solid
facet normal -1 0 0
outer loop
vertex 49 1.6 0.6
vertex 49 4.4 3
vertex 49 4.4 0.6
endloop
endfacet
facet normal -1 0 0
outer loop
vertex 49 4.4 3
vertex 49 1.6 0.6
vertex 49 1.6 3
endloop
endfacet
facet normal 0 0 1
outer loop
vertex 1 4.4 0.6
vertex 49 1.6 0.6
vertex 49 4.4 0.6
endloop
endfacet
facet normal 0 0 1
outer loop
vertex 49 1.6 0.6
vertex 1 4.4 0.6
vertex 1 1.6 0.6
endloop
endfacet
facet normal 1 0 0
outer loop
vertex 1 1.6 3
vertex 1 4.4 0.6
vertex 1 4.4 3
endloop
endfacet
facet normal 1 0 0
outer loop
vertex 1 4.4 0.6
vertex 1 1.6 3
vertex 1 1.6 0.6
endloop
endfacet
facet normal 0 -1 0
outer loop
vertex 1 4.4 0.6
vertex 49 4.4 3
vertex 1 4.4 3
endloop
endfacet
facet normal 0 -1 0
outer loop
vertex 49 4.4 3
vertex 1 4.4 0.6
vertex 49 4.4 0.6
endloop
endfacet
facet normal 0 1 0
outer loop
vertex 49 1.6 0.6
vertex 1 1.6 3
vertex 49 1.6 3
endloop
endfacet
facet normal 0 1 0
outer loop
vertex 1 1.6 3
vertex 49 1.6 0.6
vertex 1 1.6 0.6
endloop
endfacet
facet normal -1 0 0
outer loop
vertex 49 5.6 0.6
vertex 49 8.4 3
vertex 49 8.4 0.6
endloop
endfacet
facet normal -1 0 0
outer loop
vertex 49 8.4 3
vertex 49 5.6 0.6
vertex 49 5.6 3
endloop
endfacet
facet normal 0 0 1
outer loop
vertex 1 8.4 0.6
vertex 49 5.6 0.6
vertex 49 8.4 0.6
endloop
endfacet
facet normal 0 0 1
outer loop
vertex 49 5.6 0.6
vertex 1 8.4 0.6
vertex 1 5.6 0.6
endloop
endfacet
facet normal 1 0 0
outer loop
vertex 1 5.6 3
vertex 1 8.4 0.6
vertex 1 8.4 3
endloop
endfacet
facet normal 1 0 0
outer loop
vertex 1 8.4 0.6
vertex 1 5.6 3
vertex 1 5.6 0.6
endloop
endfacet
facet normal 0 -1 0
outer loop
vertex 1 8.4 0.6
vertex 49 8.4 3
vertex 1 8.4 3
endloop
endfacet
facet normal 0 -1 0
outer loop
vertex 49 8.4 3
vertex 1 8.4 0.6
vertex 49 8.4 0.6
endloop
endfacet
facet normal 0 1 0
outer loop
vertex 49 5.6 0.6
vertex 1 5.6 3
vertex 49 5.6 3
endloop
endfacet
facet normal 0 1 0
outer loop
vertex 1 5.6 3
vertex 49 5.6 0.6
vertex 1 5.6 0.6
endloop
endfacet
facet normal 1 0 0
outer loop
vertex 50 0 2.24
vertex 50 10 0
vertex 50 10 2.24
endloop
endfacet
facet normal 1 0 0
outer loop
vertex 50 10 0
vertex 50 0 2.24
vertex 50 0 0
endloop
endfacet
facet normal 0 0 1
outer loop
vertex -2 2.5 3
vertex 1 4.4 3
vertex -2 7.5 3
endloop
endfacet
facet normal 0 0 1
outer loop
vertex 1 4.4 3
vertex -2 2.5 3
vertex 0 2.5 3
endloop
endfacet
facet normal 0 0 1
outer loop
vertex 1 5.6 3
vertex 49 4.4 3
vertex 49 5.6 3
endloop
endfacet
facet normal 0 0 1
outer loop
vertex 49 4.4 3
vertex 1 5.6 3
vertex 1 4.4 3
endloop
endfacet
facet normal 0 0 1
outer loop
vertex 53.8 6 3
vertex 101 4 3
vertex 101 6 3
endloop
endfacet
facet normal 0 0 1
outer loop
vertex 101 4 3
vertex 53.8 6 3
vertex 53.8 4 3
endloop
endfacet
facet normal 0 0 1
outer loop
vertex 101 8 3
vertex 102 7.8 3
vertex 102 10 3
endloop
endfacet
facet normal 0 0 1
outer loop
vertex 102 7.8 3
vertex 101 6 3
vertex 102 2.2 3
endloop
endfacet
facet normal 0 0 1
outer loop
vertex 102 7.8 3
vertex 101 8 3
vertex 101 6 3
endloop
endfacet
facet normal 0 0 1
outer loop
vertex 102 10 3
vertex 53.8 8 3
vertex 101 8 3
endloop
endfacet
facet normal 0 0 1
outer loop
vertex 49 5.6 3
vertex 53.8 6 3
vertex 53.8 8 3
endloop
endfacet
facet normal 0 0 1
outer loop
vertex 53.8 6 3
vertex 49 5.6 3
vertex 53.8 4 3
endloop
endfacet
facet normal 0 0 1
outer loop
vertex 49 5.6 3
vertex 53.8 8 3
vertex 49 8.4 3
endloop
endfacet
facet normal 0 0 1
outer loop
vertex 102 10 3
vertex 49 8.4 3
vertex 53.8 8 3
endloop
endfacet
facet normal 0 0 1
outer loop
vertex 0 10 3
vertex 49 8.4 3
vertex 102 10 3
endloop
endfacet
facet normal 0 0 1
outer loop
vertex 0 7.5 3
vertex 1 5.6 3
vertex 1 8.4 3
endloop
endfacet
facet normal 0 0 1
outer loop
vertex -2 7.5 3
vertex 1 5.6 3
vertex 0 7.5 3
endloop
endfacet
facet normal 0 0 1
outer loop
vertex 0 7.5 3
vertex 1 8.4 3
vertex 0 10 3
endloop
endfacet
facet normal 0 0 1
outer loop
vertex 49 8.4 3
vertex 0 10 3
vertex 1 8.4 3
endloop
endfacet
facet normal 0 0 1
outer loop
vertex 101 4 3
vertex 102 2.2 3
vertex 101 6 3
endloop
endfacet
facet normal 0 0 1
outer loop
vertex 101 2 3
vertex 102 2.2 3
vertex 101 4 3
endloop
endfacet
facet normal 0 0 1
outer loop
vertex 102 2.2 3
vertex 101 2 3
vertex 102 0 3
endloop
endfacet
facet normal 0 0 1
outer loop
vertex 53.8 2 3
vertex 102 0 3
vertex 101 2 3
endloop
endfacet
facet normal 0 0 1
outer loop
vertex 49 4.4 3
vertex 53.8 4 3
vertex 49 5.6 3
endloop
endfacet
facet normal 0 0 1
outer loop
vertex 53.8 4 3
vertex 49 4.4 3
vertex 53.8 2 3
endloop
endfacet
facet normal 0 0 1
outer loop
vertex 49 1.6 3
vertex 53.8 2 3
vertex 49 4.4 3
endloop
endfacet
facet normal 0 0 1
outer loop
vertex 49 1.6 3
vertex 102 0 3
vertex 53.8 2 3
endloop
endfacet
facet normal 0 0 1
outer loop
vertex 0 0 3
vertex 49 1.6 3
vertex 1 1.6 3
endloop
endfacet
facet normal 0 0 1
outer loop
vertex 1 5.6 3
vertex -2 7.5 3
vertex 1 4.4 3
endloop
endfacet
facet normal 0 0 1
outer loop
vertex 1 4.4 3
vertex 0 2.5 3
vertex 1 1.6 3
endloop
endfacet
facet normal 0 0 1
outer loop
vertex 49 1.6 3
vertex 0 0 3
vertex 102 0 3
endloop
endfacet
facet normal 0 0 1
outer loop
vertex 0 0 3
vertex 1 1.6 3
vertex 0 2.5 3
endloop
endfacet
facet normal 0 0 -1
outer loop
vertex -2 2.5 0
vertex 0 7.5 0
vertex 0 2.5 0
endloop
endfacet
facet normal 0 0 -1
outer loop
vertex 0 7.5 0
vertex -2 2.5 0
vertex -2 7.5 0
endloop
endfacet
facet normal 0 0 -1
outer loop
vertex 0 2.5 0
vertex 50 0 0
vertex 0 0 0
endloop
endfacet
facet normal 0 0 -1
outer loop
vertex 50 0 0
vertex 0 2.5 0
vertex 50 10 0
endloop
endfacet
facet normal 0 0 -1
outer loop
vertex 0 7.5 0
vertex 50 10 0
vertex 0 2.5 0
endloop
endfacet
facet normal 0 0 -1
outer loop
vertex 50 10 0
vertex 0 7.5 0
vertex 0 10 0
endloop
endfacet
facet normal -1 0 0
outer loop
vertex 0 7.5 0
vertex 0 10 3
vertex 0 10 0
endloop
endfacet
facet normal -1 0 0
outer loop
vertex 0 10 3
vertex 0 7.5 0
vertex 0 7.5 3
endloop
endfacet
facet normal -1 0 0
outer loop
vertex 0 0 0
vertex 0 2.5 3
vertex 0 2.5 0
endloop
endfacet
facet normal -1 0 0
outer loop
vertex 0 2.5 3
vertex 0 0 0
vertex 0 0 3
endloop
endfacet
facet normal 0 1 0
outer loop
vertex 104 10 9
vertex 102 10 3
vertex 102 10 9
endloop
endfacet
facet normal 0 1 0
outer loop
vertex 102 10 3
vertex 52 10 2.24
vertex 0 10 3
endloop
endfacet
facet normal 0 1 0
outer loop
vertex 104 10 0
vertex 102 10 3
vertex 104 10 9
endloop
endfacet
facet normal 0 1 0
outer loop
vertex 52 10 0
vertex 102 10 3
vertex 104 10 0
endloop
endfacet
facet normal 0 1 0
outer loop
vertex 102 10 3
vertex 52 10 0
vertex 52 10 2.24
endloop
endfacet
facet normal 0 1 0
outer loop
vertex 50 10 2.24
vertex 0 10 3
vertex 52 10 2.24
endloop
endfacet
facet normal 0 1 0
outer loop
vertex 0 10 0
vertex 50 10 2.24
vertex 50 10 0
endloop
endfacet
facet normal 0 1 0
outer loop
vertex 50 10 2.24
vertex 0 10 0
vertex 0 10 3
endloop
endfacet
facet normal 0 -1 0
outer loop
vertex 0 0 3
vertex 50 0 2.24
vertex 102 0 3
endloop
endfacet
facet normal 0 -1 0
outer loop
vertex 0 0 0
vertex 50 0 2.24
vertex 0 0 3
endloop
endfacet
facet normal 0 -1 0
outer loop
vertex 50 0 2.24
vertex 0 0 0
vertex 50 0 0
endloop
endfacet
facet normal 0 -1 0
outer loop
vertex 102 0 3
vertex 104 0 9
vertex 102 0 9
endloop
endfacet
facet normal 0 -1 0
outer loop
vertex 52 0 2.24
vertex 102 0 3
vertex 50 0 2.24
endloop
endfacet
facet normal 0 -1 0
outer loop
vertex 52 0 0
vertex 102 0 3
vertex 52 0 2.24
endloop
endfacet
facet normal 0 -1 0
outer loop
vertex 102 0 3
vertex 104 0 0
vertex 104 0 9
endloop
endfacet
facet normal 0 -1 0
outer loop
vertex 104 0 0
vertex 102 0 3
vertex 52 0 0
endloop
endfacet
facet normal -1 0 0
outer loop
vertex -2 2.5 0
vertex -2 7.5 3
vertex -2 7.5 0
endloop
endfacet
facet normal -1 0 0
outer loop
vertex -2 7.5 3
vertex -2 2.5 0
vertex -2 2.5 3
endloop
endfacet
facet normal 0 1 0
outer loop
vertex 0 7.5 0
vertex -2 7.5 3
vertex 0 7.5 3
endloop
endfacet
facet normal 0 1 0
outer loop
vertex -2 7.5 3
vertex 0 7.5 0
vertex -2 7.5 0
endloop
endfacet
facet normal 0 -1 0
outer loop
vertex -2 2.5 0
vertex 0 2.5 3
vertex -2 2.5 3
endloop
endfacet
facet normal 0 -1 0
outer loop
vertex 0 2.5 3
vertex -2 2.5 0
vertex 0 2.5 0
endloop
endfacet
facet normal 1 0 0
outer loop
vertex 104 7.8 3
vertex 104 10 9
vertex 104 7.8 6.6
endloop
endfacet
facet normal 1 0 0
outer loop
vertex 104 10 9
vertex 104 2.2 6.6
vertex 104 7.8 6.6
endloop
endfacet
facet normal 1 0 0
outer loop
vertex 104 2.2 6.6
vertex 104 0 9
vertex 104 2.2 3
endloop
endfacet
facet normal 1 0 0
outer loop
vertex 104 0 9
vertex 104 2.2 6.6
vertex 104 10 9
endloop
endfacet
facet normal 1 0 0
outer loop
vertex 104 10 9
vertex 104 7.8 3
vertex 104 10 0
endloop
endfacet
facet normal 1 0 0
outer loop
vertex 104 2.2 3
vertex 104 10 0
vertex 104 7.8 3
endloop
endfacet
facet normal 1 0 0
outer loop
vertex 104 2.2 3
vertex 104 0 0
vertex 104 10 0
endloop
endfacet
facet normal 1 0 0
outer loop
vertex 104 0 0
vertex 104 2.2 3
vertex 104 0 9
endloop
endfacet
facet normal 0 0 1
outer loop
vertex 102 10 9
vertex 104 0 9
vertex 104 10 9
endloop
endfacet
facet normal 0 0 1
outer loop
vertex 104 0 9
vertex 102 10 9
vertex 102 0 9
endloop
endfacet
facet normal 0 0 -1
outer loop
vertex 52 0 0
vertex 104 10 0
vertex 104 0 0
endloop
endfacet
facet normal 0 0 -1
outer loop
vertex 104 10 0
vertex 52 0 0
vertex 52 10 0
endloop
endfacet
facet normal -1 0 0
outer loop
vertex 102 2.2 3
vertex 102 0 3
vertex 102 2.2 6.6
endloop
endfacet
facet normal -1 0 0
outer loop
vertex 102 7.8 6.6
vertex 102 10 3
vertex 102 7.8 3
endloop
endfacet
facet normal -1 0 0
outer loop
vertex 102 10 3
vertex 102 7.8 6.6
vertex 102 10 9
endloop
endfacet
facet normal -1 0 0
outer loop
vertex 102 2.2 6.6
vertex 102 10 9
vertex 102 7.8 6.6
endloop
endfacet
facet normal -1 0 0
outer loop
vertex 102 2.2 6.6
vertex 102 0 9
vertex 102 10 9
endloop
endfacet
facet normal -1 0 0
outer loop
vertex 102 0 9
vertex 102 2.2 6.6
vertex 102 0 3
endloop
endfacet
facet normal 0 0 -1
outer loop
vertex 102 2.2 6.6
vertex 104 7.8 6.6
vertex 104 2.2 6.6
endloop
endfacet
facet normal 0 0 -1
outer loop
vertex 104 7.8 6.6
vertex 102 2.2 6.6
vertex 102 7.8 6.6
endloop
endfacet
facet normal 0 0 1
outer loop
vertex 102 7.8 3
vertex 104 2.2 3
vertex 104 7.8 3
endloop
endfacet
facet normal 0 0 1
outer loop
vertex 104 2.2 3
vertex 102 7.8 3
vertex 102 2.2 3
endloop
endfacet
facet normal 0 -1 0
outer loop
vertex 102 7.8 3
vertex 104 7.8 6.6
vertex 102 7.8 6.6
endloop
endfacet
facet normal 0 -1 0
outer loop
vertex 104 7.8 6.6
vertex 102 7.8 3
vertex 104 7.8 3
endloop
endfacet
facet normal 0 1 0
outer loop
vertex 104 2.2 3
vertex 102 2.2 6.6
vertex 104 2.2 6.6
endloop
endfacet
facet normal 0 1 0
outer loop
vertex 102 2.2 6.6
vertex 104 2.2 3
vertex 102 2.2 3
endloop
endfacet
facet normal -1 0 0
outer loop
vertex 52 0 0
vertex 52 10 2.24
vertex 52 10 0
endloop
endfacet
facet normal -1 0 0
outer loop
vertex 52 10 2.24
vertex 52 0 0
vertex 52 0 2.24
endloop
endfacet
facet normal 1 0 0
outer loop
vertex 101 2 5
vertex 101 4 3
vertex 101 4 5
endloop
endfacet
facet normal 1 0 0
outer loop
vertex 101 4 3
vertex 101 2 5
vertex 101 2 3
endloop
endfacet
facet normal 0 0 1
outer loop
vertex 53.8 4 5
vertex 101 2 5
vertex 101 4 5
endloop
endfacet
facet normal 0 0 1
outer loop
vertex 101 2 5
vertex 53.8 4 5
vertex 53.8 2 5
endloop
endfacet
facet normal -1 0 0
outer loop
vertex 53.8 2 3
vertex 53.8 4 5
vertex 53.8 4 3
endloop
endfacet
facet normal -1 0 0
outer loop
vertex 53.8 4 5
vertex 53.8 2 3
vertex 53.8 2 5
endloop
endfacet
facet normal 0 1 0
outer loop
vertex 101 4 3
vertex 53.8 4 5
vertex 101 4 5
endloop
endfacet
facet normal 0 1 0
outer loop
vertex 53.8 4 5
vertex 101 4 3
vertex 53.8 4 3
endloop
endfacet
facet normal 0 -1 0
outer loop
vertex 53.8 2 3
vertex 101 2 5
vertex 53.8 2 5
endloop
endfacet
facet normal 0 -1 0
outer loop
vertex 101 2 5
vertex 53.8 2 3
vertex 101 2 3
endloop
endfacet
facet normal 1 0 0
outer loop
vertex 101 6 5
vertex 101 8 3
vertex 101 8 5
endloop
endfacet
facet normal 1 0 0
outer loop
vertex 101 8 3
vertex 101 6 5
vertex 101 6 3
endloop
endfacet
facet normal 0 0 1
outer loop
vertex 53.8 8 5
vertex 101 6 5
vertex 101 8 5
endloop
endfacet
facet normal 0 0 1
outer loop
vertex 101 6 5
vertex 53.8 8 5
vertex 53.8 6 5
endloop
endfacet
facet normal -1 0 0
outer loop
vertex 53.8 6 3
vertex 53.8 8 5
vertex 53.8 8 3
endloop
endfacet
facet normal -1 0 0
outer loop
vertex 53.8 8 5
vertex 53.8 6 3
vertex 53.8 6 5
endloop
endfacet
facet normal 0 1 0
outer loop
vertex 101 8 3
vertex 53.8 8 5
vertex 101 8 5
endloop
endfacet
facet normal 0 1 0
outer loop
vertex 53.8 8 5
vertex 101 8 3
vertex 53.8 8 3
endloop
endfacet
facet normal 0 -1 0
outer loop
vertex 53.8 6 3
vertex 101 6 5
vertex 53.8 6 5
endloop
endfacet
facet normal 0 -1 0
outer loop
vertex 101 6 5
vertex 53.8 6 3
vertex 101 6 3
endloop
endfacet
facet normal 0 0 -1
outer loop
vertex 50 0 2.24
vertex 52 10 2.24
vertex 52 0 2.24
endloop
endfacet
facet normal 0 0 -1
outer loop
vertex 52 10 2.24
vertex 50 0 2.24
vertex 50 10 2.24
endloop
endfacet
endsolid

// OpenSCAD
//distance between parts
distb = 2;

//length of part
le = 50;

//width of part
wi = 10;

//height of top part
he = 3;

//ridge height
rihe = 2;

//ridge width
riwi = 2;

//padding
p = 1;

//give between ridges and holes
g = .4;

//connection height
cohe = .76;

//thingy length
thle = 2;

//thingy width
thwi = 5;

//fastener give
fagi = .3;


module top()
{

  difference()
  {
    cube([le,wi,he]);

    //ridge holes
    union()
    {
      translate([p,2*p-g,he-rihe-g])
      cube([le-2*p,riwi+2*g,he+1]);

      translate([p,wi-2*p-g-riwi,he-rihe-g])
      cube([le-2*p,riwi+2*g,he+1]);
    }
  }

//fastener thingy
translate([-thle,wi/2-thwi/2,0])
cube([thle,thwi,he]);

}

module bottom()
{
translate([distb+le,0,0])
cube([le,wi,he]);

//ridges
translate([distb+le+p+2*g,2*p,he])
cube([le-2*p-2*g,riwi,rihe]);

translate([distb+le+p+2*g,wi-riwi-2*p,he])
cube([le-2*p-2*g,riwi,rihe]);


//fastener thingy
difference()
{
  translate([2*le+distb,0,0])
  cube([thle,wi,he*3]);

  translate([2*le+distb-1,wi/2-thwi/2-fagi,he])
  cube([thle*2,thwi+2*fagi,he+2*fagi]);
}
}

module connection()
{
  translate([le,0,he-cohe])
  cube([2,wi,cohe]);
}

top();
bottom();
connection();
